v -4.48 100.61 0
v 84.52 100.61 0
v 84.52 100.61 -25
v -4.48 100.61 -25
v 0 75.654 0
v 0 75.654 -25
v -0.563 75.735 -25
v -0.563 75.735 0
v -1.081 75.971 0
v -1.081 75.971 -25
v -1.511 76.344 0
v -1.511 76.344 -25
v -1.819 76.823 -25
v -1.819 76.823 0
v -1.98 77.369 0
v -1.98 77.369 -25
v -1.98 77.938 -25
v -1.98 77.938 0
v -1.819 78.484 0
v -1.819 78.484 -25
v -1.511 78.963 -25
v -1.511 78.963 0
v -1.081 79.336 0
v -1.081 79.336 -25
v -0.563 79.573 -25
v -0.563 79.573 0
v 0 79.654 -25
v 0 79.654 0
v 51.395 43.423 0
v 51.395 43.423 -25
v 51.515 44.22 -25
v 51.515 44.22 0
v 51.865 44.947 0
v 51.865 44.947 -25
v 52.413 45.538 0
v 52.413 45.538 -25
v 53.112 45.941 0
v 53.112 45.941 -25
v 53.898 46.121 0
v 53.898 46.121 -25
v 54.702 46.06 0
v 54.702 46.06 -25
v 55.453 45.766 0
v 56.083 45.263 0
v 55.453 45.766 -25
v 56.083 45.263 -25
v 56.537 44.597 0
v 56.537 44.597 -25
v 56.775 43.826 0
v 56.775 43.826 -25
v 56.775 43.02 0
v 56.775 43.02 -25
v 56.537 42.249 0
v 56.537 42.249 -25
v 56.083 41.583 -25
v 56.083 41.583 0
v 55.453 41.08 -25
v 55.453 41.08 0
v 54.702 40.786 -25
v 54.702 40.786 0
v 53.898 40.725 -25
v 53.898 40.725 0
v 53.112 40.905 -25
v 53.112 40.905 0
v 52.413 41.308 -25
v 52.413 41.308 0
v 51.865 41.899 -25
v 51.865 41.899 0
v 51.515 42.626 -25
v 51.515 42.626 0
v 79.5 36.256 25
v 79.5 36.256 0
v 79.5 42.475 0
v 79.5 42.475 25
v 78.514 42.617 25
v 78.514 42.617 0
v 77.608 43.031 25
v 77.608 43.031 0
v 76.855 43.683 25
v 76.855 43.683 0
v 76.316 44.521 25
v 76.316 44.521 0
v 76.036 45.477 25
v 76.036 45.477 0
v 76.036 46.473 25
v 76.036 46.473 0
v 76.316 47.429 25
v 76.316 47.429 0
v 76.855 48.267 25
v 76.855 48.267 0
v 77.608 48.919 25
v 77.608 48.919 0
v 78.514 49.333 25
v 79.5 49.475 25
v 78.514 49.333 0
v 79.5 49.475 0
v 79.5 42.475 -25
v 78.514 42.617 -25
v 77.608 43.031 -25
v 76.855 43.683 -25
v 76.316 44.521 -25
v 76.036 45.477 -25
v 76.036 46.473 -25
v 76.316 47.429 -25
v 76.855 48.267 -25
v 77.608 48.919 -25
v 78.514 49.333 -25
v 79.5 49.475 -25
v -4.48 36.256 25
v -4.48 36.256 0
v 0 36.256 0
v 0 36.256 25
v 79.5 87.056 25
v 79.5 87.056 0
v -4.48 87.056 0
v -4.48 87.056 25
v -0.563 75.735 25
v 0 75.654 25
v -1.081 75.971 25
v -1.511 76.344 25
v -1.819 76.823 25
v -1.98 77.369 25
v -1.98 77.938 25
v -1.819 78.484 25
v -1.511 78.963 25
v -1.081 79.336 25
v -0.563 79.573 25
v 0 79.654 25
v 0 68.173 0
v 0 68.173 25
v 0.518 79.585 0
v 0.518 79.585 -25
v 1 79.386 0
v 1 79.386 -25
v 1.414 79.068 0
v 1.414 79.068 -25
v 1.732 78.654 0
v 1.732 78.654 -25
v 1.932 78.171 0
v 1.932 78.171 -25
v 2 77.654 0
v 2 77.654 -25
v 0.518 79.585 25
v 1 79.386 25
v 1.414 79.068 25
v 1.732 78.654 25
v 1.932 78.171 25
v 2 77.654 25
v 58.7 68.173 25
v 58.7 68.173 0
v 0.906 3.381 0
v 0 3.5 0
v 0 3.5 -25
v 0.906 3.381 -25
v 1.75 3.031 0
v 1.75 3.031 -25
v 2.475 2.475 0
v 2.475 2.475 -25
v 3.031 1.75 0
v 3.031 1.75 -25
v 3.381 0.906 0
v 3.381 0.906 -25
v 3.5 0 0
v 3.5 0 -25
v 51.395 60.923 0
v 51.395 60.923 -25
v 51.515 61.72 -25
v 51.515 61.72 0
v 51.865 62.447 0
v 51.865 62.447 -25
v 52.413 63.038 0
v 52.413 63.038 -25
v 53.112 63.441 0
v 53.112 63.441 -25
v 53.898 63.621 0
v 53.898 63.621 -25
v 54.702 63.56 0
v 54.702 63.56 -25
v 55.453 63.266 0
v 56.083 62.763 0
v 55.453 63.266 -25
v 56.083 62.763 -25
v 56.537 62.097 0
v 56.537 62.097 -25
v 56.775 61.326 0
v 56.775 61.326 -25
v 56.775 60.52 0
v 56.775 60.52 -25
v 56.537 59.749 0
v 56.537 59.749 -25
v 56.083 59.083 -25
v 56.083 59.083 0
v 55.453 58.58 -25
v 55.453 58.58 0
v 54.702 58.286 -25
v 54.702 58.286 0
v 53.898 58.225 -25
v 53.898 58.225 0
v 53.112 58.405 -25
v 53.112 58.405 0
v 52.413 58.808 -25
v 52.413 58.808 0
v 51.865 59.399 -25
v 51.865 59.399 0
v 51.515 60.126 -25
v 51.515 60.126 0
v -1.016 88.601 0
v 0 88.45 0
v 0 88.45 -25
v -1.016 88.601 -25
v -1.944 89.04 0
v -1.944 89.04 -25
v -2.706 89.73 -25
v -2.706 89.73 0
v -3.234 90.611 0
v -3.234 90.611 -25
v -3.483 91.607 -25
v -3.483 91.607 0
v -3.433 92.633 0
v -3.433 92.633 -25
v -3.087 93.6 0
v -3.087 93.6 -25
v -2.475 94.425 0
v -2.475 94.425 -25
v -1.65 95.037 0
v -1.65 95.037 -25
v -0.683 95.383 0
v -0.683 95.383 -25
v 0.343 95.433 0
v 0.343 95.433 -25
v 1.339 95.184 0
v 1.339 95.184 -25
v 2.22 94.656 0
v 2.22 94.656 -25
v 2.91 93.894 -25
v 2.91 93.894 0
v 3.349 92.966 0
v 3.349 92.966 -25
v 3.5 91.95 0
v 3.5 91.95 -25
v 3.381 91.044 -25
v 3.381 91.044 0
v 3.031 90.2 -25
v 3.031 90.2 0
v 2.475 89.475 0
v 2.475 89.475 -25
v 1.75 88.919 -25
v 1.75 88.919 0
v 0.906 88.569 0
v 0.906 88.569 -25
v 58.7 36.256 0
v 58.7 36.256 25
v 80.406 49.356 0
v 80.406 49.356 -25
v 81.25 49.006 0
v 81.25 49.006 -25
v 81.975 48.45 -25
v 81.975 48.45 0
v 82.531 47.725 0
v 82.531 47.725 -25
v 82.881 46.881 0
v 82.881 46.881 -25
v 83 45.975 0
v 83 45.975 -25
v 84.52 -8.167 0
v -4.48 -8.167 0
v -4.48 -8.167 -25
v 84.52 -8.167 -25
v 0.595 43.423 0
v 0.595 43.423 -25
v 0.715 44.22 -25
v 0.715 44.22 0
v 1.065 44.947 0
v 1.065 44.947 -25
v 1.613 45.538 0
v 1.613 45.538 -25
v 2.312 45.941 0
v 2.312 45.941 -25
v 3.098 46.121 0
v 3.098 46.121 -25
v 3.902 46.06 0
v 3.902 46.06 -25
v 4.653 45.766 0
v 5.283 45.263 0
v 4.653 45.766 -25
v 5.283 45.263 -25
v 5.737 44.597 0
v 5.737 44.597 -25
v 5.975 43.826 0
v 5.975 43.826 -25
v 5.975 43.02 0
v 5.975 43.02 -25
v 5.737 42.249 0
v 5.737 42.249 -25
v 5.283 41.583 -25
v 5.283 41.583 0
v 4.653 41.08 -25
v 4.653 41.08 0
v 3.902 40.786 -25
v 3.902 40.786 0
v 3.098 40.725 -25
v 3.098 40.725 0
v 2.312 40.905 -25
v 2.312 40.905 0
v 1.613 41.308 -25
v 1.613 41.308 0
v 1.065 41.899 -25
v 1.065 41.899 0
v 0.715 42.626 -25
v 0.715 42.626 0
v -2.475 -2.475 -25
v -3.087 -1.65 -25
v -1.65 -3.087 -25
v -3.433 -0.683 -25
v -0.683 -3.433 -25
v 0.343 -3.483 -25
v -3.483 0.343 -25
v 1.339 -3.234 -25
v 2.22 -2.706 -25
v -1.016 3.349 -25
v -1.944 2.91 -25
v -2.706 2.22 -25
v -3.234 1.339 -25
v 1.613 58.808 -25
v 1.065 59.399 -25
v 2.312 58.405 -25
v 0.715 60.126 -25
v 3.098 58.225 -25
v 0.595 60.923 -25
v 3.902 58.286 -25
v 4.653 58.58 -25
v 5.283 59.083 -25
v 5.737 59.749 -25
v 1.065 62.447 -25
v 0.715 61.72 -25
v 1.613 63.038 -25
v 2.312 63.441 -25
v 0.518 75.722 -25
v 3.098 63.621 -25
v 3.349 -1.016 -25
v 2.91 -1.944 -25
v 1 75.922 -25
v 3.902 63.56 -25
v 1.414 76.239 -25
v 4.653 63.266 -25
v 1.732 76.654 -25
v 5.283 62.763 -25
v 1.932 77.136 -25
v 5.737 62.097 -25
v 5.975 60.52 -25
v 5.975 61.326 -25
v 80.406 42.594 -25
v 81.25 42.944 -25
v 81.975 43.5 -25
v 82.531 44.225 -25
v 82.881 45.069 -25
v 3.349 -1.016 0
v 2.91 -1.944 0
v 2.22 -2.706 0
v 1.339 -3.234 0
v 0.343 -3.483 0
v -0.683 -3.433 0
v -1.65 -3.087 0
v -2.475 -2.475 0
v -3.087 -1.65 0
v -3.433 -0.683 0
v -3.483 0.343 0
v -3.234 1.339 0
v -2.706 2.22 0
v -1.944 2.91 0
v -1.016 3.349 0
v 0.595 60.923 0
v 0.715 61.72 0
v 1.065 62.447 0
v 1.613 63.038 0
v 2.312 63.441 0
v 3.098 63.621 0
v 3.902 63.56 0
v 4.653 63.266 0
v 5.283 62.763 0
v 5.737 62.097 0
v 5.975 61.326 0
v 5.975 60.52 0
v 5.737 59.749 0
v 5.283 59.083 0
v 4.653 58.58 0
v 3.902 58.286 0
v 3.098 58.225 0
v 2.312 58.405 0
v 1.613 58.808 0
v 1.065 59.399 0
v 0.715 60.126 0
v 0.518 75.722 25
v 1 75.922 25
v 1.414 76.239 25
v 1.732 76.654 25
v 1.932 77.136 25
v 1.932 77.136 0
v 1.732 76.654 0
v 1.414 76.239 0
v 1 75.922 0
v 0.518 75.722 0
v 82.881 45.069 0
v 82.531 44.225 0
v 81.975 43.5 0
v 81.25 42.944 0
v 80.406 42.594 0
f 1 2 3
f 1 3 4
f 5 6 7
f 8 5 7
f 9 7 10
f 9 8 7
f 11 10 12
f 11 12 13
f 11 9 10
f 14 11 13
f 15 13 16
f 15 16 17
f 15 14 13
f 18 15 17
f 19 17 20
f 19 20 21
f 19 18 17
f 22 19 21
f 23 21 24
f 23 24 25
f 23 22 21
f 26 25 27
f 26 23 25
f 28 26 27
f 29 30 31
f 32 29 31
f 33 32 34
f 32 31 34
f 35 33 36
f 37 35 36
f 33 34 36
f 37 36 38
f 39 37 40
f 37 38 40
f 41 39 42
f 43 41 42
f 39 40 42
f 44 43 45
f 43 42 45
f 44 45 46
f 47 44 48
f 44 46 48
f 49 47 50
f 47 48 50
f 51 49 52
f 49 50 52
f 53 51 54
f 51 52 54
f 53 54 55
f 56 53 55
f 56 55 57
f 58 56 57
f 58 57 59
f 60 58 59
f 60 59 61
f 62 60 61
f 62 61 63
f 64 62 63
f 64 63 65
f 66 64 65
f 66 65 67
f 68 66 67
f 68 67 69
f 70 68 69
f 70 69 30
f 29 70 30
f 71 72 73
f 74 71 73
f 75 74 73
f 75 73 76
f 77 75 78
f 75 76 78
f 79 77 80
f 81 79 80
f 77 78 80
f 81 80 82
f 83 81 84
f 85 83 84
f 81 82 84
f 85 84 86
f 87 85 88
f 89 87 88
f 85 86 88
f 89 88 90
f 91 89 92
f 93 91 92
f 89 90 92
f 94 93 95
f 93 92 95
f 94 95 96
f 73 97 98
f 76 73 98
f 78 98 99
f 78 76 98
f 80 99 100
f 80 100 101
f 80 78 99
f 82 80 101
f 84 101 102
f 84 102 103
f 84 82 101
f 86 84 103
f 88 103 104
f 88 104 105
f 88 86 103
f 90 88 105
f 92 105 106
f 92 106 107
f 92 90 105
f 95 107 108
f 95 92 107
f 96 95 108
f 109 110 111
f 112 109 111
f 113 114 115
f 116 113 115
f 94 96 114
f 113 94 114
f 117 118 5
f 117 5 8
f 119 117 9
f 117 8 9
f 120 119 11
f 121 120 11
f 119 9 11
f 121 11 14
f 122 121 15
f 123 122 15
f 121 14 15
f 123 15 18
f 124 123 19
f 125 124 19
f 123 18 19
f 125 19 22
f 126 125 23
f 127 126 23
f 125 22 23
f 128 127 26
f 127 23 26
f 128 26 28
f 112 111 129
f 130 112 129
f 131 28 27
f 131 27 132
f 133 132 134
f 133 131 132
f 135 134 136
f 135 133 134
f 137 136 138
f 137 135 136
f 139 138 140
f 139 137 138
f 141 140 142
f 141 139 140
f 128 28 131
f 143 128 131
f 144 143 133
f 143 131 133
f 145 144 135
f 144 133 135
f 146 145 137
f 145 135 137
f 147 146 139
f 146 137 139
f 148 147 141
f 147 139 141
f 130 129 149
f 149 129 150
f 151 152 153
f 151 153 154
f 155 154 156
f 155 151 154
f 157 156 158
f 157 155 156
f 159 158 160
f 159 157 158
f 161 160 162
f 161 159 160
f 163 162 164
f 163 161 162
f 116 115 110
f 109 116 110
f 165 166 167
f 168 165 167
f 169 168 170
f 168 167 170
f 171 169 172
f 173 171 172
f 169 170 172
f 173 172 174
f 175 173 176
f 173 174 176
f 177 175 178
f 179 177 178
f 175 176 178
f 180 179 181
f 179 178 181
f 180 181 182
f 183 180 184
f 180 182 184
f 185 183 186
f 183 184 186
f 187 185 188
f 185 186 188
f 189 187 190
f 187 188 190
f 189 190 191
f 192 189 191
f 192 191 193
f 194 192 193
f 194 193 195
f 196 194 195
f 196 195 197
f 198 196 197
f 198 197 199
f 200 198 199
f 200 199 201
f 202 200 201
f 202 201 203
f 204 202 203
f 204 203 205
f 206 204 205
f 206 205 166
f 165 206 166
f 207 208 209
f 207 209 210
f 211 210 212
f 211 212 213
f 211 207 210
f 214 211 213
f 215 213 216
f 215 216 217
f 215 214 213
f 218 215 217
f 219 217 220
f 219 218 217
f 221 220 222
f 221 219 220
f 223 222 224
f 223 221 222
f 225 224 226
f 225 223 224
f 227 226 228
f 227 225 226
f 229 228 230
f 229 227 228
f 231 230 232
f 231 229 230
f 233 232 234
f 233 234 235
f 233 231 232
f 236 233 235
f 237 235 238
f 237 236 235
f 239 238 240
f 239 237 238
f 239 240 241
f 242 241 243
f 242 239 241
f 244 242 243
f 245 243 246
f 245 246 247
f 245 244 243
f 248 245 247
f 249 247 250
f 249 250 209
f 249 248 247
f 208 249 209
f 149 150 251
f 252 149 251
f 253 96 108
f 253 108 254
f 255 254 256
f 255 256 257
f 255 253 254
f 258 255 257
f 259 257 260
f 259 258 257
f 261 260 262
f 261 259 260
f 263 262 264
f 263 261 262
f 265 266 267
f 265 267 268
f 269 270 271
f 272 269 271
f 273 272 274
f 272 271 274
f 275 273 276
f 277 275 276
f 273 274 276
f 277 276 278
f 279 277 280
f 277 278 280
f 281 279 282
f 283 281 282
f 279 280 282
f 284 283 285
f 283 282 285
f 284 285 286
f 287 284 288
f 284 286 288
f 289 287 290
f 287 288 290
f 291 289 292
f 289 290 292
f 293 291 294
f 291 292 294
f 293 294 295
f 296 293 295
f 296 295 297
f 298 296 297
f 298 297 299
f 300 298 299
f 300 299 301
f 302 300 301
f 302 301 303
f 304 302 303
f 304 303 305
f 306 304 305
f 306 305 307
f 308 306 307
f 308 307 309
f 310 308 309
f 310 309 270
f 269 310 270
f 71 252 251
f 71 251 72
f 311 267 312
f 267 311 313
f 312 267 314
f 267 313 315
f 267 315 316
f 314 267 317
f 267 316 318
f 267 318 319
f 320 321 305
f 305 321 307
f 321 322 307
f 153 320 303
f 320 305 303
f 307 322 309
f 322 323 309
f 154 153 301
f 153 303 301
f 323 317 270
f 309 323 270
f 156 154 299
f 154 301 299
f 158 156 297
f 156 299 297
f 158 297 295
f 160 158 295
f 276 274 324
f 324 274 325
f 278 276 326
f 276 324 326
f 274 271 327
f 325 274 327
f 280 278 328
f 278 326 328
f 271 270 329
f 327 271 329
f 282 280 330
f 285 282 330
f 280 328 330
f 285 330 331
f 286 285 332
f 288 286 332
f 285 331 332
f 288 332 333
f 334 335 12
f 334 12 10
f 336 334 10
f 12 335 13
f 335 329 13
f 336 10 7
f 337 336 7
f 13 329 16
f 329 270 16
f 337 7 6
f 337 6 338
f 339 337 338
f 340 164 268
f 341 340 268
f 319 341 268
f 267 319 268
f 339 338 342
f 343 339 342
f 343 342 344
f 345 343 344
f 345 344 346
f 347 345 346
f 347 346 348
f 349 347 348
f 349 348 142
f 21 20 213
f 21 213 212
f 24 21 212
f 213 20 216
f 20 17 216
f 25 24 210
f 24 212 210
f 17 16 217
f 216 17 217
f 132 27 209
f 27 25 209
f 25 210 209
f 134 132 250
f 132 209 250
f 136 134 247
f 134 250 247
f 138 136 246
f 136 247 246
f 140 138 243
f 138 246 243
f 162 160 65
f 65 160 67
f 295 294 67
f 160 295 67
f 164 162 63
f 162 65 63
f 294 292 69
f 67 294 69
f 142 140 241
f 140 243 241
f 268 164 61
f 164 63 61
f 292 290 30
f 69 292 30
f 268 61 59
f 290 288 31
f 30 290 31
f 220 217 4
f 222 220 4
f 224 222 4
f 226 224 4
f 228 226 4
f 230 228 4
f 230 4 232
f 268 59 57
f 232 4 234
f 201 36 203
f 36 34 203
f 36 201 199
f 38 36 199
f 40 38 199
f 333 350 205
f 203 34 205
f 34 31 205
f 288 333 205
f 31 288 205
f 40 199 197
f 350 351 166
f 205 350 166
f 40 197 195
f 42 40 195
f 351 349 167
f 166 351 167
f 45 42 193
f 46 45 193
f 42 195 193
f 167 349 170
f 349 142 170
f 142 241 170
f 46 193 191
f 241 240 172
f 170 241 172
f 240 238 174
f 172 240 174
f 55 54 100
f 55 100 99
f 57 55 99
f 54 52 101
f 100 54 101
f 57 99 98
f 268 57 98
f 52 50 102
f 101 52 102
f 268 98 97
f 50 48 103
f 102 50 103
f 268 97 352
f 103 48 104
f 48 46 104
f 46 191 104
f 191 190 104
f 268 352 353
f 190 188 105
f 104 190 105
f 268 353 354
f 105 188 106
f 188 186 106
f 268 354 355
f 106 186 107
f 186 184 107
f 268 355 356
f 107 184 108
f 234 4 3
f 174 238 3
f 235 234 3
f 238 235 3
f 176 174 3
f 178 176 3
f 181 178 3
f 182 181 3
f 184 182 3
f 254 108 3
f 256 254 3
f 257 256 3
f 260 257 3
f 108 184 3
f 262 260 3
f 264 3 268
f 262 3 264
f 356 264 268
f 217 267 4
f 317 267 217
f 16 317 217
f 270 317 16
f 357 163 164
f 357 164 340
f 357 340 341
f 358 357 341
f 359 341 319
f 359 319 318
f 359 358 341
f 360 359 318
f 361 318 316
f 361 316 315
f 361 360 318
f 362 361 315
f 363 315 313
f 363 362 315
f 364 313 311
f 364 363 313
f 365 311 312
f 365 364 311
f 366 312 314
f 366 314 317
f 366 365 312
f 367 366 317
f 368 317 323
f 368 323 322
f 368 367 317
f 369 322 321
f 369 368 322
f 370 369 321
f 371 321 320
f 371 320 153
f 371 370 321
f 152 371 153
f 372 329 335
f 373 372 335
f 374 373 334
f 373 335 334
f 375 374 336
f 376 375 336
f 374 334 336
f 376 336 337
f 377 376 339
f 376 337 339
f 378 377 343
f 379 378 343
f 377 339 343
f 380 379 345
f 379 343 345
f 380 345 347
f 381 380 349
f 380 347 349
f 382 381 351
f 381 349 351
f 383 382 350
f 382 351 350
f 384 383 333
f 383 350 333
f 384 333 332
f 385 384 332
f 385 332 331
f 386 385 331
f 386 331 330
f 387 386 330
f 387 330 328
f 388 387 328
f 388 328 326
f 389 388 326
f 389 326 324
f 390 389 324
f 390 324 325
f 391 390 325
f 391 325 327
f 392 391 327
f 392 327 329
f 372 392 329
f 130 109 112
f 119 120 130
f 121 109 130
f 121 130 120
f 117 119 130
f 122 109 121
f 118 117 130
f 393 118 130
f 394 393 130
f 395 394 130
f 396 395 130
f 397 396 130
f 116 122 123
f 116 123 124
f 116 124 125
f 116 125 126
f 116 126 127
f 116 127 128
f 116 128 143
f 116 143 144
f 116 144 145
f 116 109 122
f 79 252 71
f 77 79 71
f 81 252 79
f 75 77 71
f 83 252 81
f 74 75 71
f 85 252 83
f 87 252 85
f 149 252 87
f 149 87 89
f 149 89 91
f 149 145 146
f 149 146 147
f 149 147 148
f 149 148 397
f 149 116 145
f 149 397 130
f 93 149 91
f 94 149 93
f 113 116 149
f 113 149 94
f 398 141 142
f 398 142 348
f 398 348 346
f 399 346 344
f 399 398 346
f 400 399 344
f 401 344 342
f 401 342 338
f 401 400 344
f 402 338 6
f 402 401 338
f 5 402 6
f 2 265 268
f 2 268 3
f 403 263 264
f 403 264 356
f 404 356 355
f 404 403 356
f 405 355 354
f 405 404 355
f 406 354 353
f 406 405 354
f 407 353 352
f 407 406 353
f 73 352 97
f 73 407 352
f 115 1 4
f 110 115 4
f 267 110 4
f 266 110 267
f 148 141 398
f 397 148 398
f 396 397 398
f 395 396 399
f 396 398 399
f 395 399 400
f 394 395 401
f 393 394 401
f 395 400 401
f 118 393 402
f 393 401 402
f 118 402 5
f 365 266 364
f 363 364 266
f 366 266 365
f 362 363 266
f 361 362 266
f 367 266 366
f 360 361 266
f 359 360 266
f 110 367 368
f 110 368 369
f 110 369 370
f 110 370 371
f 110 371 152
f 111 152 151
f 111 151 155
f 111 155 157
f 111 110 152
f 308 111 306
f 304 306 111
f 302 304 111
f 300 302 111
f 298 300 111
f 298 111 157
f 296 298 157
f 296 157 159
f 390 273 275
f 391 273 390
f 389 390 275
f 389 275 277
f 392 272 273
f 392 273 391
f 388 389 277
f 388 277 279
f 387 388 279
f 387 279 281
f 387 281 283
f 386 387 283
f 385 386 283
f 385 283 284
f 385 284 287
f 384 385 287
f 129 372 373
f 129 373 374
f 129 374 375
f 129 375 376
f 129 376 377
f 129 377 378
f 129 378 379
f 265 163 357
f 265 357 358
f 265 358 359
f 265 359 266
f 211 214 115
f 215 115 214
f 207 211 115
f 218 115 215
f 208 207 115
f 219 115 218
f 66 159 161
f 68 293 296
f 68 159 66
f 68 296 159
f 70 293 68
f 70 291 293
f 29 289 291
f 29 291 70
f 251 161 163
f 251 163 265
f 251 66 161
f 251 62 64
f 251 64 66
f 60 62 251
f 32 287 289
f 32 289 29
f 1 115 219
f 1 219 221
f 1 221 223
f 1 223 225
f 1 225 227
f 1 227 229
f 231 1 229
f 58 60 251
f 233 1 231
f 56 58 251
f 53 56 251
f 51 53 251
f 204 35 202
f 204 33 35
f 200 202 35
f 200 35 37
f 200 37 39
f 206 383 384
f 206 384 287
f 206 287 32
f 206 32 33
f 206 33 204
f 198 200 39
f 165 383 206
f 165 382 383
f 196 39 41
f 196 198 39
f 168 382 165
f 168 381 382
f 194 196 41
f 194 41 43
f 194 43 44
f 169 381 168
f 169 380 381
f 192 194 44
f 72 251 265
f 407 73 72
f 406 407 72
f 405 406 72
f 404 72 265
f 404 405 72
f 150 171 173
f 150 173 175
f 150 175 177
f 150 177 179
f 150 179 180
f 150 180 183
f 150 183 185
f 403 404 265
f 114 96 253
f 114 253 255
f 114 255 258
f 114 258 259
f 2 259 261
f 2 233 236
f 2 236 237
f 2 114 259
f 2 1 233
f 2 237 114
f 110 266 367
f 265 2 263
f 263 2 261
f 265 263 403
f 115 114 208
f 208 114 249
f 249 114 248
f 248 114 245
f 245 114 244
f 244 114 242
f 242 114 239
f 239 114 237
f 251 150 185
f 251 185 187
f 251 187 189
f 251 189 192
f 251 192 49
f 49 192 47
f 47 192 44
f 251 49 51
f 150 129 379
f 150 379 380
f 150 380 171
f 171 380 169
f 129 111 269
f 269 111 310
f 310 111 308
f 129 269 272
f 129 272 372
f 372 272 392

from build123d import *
from build123d import SkipClean  # not in build123d's __all__

# Parameters (mm, degrees)
F0_W     = 58.7
F0_H     = 31.916891567
F0_W_2   = 50.8
F0_H_2   = 17.5
F0_W_3   = 1.3
F0_H_3   = 0.083108433
F1_DEPTH = 25
F2_D     = 5.4102
F3_DEPTH = 25


with BuildPart() as f1:
    # F0 (on Top) → F1 (new body)
    with BuildSketch(Plane.XY):
        with BuildLine():
            ThreePointArc((0, 3.5), (2.4748737342, 2.4748737342), (3.5, 0))
            Line((3.5, 0), (79.5, 0))
            Line((79.5, 0), (79.5, 36.256108433))
            Line((79.5, 36.256108433), (58.7, 36.256108433))
            Line((58.7, 36.256108433), (58.7, 36.173))
            Line((58.7, 36.173), (0, 36.173))
            Line((0, 36.173), (0, 3.5))
        make_face()
        with BuildLine():
            Line((58.7, 36.256108433), (79.5, 36.256108433))
            Line((79.5, 36.256108433), (79.5, 42.475))
            ThreePointArc((79.5, 42.475), (76, 45.975), (79.5, 49.475))
            Line((79.5, 49.475), (79.5, 87.056108433))
            Line((79.5, 87.056108433), (0, 87.056108433))
            Line((0, 87.056108433), (0, 79.6536390185))
            ThreePointArc((0, 79.6536390185), (1.4142135624, 79.0678525809), (2, 77.6536390185))
            ThreePointArc((2, 77.6536390185), (1.4142135624, 76.2394254562), (0, 75.6536390185))
            Line((0, 75.6536390185), (0, 68.173))
            Line((0, 68.173), (58.7, 68.173))
            Line((58.7, 68.173), (58.7, 36.256108433))
        make_face()
        with Locations((29.35, 52.2145542165)):
            Rectangle(F0_W, F0_H)
        with Locations((28.7, 52.173)):
            Rectangle(F0_W_2, F0_H_2, mode=Mode.SUBTRACT)
        with BuildLine():
            Line((79.5, 0), (3.5, 0))
            ThreePointArc((3.5, 0), (-2.4748737342, -2.4748737342), (0, 3.5))
            Line((0, 3.5), (0, 36.173))
            Line((0, 36.173), (-1.3, 36.173))
            Line((-1.3, 36.173), (-1.3, 36.256108433))
            Line((-1.3, 36.256108433), (-4.48, 36.256108433))
            Line((-4.48, 36.256108433), (-4.48, -8.1671467051))
            Line((-4.48, -8.1671467051), (84.52, -8.1671467051))
            Line((84.52, -8.1671467051), (84.52, 36.256108433))
            Line((84.52, 36.256108433), (79.5, 36.256108433))
            Line((79.5, 36.256108433), (79.5, 0))
        make_face()
        with Locations((28.7, 52.173)):
            Rectangle(F0_W_2, F0_H_2)
        with BuildLine():
            Line((79.5, 87.056108433), (84.52, 87.056108433))
            Line((84.52, 87.056108433), (84.52, 100.6101816893))
            Line((84.52, 100.6101816893), (28.7, 100.6101816893))
            Line((28.7, 100.6101816893), (-4.48, 100.6101816893))
            Line((-4.48, 100.6101816893), (-4.48, 87.056108433))
            Line((-4.48, 87.056108433), (0, 87.056108433))
            Line((0, 87.056108433), (0, 88.45))
            ThreePointArc((0, 88.45), (-2.4748737342, 94.4248737342), (3.5, 91.95))
            Line((3.5, 91.95), (79.5, 91.95))
            Line((79.5, 91.95), (79.5, 87.056108433))
        make_face()
        with BuildLine():
            Line((0, 87.056108433), (79.5, 87.056108433))
            Line((79.5, 87.056108433), (79.5, 91.95))
            Line((79.5, 91.95), (3.5, 91.95))
            ThreePointArc((3.5, 91.95), (2.4748737342, 89.4751262658), (0, 88.45))
            Line((0, 88.45), (0, 87.056108433))
        make_face()
        with BuildLine():
            Line((79.5, 42.475), (79.5, 36.256108433))
            Line((79.5, 36.256108433), (84.52, 36.256108433))
            Line((84.52, 36.256108433), (84.52, 87.056108433))
            Line((84.52, 87.056108433), (79.5, 87.056108433))
            Line((79.5, 87.056108433), (79.5, 49.475))
            ThreePointArc((79.5, 49.475), (81.9748737342, 48.4498737342), (83, 45.975))
            ThreePointArc((83, 45.975), (81.9748737342, 43.5001262658), (79.5, 42.475))
        make_face()
        with BuildLine():
            Line((-1.3, 68.173), (0, 68.173))
            Line((0, 68.173), (0, 75.6536390185))
            ThreePointArc((0, 75.6536390185), (-2, 77.6536390185), (0, 79.6536390185))
            Line((0, 79.6536390185), (0, 87.056108433))
            Line((0, 87.056108433), (-4.48, 87.056108433))
            Line((-4.48, 87.056108433), (-4.48, 36.256108433))
            Line((-4.48, 36.256108433), (-1.3, 36.256108433))
            Line((-1.3, 36.256108433), (-1.3, 68.173))
        make_face()
        with Locations((-0.65, 52.2145542165)):
            Rectangle(F0_W_3, F0_H)
        with Locations((29.35, 36.2145542165)):
            Rectangle(F0_W, F0_H_3)
        with Locations((-0.65, 36.2145542165)):
            Rectangle(F0_W_3, F0_H_3)
    extrude(amount=-F1_DEPTH)

    # F2 (through all)
    with Locations(Plane.XY):
        with Locations((3.3, 60.923), (3.3, 43.423), (54.1, 43.423), (54.1, 60.923)):
            Hole(F2_D / 2)

    # F0 (on Top) → F3 (join)
    with BuildSketch(Plane.XY):
        with BuildLine():
            Line((-1.3, 68.173), (0, 68.173))
            Line((0, 68.173), (0, 75.6536390185))
            ThreePointArc((0, 75.6536390185), (-2, 77.6536390185), (0, 79.6536390185))
            Line((0, 79.6536390185), (0, 87.056108433))
            Line((0, 87.056108433), (-4.48, 87.056108433))
            Line((-4.48, 87.056108433), (-4.48, 36.256108433))
            Line((-4.48, 36.256108433), (-1.3, 36.256108433))
            Line((-1.3, 36.256108433), (-1.3, 68.173))
        make_face()
        with BuildLine():
            Line((58.7, 36.256108433), (79.5, 36.256108433))
            Line((79.5, 36.256108433), (79.5, 42.475))
            ThreePointArc((79.5, 42.475), (76, 45.975), (79.5, 49.475))
            Line((79.5, 49.475), (79.5, 87.056108433))
            Line((79.5, 87.056108433), (0, 87.056108433))
            Line((0, 87.056108433), (0, 79.6536390185))
            ThreePointArc((0, 79.6536390185), (1.4142135624, 79.0678525809), (2, 77.6536390185))
            ThreePointArc((2, 77.6536390185), (1.4142135624, 76.2394254562), (0, 75.6536390185))
            Line((0, 75.6536390185), (0, 68.173))
            Line((0, 68.173), (58.7, 68.173))
            Line((58.7, 68.173), (58.7, 36.256108433))
        make_face()
        with Locations((-0.65, 52.2145542165)):
            Rectangle(F0_W_3, F0_H)
    with SkipClean():  # cleaning this boolean's faces spoils the solid; the shape is the same uncleaned
        extrude(amount=F3_DEPTH)


solid = f1.part
